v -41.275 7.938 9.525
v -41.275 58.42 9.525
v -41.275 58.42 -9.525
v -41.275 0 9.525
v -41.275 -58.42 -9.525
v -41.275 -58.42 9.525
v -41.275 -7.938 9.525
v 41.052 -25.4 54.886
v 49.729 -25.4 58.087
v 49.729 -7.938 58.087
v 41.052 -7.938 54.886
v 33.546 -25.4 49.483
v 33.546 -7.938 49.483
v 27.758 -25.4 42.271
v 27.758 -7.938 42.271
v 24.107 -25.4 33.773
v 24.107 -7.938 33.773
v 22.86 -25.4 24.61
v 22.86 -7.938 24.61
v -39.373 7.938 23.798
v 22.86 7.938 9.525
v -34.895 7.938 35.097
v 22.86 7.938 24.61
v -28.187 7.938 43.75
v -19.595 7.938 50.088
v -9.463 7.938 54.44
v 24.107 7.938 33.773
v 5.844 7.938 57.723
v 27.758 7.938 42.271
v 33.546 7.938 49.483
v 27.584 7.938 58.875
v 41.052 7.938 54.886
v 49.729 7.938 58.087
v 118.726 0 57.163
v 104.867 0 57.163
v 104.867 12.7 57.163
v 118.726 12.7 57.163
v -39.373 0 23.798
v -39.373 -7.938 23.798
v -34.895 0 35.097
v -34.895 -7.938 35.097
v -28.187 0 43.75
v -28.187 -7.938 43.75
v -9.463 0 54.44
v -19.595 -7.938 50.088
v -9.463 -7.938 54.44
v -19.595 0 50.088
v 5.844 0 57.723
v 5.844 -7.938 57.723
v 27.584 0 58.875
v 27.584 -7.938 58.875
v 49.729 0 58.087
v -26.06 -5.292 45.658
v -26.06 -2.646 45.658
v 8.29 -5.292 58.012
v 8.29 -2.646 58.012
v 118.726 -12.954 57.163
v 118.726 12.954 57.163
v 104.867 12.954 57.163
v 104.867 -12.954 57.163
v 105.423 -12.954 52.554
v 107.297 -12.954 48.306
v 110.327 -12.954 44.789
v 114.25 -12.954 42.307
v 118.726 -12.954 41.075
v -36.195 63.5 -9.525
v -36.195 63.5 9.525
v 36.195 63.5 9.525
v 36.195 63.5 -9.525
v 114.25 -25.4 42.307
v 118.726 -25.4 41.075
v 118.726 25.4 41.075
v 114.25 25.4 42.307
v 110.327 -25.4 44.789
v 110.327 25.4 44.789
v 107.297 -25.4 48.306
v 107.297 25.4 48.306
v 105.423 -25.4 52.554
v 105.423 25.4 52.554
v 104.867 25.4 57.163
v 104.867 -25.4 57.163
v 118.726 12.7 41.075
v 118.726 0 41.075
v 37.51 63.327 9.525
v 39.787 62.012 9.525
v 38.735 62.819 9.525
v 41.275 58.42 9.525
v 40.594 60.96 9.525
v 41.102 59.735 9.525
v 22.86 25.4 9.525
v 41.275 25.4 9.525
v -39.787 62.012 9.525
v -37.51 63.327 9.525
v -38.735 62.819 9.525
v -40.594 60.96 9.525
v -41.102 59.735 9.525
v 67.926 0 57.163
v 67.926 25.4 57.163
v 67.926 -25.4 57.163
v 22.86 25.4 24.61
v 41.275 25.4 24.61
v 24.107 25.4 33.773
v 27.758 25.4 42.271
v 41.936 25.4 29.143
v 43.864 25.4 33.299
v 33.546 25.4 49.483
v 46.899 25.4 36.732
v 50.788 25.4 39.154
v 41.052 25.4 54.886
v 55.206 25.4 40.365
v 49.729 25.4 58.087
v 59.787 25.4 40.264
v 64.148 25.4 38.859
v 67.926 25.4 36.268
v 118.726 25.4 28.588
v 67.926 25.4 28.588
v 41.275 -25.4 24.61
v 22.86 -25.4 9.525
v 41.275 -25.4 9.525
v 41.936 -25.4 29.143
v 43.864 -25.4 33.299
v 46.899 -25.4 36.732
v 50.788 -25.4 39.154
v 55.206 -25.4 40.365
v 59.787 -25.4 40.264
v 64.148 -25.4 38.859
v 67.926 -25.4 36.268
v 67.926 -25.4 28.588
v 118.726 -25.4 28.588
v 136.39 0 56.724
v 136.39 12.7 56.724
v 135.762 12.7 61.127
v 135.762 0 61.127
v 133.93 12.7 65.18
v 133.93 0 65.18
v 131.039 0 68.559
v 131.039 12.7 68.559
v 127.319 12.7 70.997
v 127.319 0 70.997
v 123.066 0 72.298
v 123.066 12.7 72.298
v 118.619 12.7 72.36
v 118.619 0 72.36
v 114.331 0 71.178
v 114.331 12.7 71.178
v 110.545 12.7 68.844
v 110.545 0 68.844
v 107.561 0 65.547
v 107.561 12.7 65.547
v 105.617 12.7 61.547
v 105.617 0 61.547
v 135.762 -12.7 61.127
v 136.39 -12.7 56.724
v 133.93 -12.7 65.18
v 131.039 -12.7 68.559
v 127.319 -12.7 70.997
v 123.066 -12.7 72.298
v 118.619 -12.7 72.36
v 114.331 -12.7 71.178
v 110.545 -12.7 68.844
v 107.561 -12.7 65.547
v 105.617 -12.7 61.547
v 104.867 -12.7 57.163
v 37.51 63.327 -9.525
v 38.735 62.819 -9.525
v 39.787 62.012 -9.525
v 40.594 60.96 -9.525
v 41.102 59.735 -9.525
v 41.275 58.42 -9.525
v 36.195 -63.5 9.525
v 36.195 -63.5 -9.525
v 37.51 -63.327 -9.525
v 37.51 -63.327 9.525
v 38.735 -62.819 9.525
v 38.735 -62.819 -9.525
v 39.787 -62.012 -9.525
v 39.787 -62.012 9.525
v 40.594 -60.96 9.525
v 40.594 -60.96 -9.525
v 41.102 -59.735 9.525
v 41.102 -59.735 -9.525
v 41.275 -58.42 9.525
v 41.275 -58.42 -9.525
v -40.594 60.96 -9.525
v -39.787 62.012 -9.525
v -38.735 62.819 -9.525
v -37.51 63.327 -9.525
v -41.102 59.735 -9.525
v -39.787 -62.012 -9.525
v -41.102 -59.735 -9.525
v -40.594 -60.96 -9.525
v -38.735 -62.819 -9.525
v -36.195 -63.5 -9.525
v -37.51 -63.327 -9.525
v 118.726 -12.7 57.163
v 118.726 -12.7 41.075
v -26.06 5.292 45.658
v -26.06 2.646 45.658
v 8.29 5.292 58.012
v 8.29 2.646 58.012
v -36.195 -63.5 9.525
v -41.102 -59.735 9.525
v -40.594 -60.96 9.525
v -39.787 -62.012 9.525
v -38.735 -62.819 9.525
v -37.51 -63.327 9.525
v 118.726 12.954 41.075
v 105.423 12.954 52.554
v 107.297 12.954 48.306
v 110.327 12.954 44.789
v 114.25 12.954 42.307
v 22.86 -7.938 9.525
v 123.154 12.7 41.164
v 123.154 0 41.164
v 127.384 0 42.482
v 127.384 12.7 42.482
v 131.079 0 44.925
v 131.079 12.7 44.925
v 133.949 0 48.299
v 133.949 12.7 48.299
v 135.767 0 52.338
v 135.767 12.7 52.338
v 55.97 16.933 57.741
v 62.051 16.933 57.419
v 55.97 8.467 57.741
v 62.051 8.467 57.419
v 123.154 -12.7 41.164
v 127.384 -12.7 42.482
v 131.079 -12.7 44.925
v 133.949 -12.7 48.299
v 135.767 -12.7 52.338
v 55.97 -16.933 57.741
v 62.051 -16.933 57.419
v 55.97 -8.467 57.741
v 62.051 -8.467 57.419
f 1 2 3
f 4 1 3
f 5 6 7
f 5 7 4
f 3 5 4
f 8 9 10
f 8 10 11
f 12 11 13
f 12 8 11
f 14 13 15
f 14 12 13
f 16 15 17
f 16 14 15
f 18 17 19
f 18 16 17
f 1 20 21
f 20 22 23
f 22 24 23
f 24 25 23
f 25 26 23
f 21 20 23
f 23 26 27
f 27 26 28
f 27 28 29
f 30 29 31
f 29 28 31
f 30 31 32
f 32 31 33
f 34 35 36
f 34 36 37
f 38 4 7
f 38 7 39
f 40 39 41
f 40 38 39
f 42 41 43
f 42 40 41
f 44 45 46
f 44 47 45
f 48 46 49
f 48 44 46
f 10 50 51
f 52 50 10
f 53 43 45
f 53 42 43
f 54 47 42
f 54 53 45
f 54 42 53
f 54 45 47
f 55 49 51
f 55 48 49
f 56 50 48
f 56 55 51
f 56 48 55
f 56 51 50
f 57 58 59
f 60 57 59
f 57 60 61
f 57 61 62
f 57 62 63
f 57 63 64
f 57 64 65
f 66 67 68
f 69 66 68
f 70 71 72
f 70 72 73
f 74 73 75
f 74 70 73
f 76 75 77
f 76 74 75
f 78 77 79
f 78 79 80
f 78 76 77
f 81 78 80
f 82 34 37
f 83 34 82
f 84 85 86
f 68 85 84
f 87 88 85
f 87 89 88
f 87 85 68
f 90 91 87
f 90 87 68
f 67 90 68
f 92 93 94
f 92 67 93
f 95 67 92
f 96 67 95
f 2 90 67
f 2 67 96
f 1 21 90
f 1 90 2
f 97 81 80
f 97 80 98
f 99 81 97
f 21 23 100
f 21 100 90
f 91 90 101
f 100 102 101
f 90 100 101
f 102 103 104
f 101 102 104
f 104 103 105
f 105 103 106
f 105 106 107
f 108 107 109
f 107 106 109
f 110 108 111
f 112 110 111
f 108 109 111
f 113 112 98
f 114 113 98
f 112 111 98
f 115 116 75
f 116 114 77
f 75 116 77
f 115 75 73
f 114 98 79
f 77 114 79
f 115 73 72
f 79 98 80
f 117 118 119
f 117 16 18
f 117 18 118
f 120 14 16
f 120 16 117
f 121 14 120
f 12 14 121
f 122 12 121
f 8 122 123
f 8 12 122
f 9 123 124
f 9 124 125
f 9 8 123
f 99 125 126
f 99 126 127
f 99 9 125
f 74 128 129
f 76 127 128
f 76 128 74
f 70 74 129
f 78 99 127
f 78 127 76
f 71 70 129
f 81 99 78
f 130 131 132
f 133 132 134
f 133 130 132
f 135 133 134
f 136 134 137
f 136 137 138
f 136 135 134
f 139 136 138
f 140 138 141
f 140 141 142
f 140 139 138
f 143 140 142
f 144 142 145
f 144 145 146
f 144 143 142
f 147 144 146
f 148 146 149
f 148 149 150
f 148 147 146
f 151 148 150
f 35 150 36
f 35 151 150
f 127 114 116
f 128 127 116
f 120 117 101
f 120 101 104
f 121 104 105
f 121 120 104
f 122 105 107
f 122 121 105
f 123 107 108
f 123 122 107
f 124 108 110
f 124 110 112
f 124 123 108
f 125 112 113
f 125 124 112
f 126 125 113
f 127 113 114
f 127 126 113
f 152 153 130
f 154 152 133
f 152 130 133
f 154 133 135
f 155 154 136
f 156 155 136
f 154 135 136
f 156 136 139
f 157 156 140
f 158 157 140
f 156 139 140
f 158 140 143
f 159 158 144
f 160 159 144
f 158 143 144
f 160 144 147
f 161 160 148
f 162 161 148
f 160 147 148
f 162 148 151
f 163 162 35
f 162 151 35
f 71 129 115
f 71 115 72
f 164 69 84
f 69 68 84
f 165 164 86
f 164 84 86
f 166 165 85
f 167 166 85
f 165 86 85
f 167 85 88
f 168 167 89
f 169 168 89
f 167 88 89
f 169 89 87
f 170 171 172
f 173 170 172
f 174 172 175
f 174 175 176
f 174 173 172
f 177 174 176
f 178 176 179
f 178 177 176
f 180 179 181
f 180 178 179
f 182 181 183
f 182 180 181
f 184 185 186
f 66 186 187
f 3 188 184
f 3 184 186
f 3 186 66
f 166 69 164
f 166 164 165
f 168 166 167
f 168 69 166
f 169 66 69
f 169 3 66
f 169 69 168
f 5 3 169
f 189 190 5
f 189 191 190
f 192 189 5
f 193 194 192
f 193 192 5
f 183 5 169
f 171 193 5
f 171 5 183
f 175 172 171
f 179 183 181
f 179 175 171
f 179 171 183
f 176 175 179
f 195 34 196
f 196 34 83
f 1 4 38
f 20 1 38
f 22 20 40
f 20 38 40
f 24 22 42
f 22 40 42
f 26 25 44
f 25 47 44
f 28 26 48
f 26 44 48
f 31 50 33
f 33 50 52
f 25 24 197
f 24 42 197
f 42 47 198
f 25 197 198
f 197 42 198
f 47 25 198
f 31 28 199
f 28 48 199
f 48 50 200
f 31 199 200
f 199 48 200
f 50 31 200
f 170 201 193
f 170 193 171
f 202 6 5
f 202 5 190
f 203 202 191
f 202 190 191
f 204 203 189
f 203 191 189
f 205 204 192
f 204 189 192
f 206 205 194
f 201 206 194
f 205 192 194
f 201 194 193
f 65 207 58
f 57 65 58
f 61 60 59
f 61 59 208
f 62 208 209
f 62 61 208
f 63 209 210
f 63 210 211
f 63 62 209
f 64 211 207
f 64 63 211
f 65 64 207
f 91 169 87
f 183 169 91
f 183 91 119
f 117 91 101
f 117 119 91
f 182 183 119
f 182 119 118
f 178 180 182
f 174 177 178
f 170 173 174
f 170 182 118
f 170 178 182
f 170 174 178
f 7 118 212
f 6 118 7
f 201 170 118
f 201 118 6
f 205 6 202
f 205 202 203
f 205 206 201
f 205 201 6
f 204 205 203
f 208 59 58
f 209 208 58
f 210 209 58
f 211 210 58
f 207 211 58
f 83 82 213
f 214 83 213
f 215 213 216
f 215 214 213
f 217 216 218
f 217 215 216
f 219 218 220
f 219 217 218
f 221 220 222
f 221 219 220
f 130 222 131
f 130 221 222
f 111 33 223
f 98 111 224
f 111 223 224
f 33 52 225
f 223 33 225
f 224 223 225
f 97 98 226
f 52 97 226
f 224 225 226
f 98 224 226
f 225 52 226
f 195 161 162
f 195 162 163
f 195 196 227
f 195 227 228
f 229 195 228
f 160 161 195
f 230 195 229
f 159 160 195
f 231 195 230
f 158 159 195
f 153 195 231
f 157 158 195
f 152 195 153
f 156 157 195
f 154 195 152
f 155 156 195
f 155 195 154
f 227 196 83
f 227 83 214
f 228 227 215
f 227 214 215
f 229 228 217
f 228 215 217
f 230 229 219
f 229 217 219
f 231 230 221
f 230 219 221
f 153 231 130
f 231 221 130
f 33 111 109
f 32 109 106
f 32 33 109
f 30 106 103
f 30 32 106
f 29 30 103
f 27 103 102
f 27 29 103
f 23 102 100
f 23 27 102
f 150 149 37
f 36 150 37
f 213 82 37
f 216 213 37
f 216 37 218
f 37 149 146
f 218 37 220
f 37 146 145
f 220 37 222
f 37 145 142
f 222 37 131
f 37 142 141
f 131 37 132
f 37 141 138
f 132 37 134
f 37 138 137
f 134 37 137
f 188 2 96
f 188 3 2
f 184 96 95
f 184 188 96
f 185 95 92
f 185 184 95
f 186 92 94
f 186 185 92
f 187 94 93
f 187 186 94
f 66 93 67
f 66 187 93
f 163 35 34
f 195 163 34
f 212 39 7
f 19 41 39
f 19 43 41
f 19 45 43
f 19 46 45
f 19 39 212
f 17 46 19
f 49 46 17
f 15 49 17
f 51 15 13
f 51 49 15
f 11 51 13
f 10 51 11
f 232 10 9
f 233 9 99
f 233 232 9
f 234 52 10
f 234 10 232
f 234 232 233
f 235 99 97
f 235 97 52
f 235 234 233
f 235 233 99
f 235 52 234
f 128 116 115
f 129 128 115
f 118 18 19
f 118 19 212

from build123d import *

# Parameters (mm, degrees)
F1_DEPTH = 63.5
F2_DEPTH = 25.4
F3_DEPTH = 7.9375
F4_R     = 5.08
F5_DEPTH = 12.7
F6_DEPTH = 12.954


# Not quite as in the source:
# - a feature names something its author has since deleted; it is built from what else it names


with BuildPart() as f1:
    # F0 (on Front) → F1 (new body, symmetric)
    with BuildSketch(Plane.XZ):
        Polygon((41.275, -9.525), (41.275, 9.525), (22.86, 9.525), (-41.275, 9.525), (-41.275, -9.525), align=None)
    extrude(amount=F1_DEPTH, both=True)

    # F0 (on Front) → F2 (join, symmetric)
    with BuildSketch(Plane.XZ):
        with BuildLine():
            Line((22.86, 9.525), (41.275, 9.525))
            Line((41.275, 9.525), (41.275, 24.6097946961))
            ThreePointArc((41.275, 24.6097946961), (50.7878547404, 39.1541658648), (67.925549001, 36.2675461399))
            Line((67.925549001, 36.2675461399), (67.925549001, 57.1627))
            add(Edge.make_bspline(
                [(49.7285614833, 58.0870459324), (56.0365853953, 57.7436105447), (62.1682234861, 57.3725135069), (67.925549001, 57.1627)],
                knots=[103.2417964532, 103.2417964532, 103.2417964532, 103.2417964532, 119.139037949, 119.139037949, 119.139037949, 119.139037949], degree=3))
            ThreePointArc((49.7285614833, 58.0870459324), (30.4078494999, 46.0728207323), (22.86, 24.6097946961))
            Line((22.86, 24.6097946961), (22.86, 9.525))
        make_face()
        with BuildLine():
            Line((67.925549001, 57.1627), (67.925549001, 36.2675461399))
            Line((67.925549001, 36.2675461399), (67.925549001, 28.5877))
            Line((67.925549001, 28.5877), (118.725549001, 28.5877))
            Line((118.725549001, 28.5877), (118.725549001, 41.0749236981))
            ThreePointArc((118.725549001, 41.0749236981), (108.6814992651, 46.435602827), (104.8671576362, 57.1627))
            Line((104.8671576362, 57.1627), (67.925549001, 57.1627))
        make_face()
    extrude(amount=F2_DEPTH, both=True)

    # F0 (on Front) → F3 (join, symmetric)
    with BuildSketch(Plane.XZ):
        with BuildLine():
            Line((-41.275, 9.525), (22.86, 9.525))
            Line((22.86, 9.525), (22.86, 24.6097946961))
            ThreePointArc((22.86, 24.6097946961), (30.4078494999, 46.0728207323), (49.7285614833, 58.0870459324))
            add(Edge.make_bspline(
                [(-41.275, 9.525), (-39.6433941578, 61.3811419555), (8.7622264795, 60.3174257381), (49.7285614833, 58.0870459324)],
                knots=[0, 0, 0, 0, 103.2417964532, 103.2417964532, 103.2417964532, 103.2417964532], degree=3))
        make_face()
    extrude(amount=F3_DEPTH, both=True)

    # F4
    f4_edges = [f1.edges().sort_by_distance(p)[0] for p in [
        (-41.275, -63.5, 0),
        (41.275, -63.5, 0),
        (41.275, 63.5, 0),
        (-41.275, 63.5, 0),
    ]]
    fillet(f4_edges, radius=F4_R)


with BuildPart() as f5:
    # F0 (on Front) → F5 (new body, symmetric)
    with BuildSketch(Plane.XZ):
        with BuildLine():
            ThreePointArc((136.389559184, 56.7242838442), (120.8445389242, 72.4870089264), (104.8671576362, 57.1627))
            Line((104.8671576362, 57.1627), (118.725549001, 57.1627))
            Line((118.725549001, 57.1627), (118.725549001, 41.0749236981))
            ThreePointArc((118.725549001, 41.0749236981), (131.0790951476, 44.9247104544), (136.389559184, 56.7242838442))
        make_face()
    extrude(amount=F5_DEPTH, both=True)


with BuildPart() as f6:
    # F0 (on Front) → F6 (new body, symmetric)
    with BuildSketch(Plane.XZ):
        with BuildLine():
            Line((118.725549001, 57.1627), (104.8671576362, 57.1627))
            ThreePointArc((104.8671576362, 57.1627), (108.6814992651, 46.435602827), (118.725549001, 41.0749236981))
            Line((118.725549001, 41.0749236981), (118.725549001, 57.1627))
        make_face()
    extrude(amount=F6_DEPTH, both=True)


solid = Compound([f1.part, f5.part, f6.part])
